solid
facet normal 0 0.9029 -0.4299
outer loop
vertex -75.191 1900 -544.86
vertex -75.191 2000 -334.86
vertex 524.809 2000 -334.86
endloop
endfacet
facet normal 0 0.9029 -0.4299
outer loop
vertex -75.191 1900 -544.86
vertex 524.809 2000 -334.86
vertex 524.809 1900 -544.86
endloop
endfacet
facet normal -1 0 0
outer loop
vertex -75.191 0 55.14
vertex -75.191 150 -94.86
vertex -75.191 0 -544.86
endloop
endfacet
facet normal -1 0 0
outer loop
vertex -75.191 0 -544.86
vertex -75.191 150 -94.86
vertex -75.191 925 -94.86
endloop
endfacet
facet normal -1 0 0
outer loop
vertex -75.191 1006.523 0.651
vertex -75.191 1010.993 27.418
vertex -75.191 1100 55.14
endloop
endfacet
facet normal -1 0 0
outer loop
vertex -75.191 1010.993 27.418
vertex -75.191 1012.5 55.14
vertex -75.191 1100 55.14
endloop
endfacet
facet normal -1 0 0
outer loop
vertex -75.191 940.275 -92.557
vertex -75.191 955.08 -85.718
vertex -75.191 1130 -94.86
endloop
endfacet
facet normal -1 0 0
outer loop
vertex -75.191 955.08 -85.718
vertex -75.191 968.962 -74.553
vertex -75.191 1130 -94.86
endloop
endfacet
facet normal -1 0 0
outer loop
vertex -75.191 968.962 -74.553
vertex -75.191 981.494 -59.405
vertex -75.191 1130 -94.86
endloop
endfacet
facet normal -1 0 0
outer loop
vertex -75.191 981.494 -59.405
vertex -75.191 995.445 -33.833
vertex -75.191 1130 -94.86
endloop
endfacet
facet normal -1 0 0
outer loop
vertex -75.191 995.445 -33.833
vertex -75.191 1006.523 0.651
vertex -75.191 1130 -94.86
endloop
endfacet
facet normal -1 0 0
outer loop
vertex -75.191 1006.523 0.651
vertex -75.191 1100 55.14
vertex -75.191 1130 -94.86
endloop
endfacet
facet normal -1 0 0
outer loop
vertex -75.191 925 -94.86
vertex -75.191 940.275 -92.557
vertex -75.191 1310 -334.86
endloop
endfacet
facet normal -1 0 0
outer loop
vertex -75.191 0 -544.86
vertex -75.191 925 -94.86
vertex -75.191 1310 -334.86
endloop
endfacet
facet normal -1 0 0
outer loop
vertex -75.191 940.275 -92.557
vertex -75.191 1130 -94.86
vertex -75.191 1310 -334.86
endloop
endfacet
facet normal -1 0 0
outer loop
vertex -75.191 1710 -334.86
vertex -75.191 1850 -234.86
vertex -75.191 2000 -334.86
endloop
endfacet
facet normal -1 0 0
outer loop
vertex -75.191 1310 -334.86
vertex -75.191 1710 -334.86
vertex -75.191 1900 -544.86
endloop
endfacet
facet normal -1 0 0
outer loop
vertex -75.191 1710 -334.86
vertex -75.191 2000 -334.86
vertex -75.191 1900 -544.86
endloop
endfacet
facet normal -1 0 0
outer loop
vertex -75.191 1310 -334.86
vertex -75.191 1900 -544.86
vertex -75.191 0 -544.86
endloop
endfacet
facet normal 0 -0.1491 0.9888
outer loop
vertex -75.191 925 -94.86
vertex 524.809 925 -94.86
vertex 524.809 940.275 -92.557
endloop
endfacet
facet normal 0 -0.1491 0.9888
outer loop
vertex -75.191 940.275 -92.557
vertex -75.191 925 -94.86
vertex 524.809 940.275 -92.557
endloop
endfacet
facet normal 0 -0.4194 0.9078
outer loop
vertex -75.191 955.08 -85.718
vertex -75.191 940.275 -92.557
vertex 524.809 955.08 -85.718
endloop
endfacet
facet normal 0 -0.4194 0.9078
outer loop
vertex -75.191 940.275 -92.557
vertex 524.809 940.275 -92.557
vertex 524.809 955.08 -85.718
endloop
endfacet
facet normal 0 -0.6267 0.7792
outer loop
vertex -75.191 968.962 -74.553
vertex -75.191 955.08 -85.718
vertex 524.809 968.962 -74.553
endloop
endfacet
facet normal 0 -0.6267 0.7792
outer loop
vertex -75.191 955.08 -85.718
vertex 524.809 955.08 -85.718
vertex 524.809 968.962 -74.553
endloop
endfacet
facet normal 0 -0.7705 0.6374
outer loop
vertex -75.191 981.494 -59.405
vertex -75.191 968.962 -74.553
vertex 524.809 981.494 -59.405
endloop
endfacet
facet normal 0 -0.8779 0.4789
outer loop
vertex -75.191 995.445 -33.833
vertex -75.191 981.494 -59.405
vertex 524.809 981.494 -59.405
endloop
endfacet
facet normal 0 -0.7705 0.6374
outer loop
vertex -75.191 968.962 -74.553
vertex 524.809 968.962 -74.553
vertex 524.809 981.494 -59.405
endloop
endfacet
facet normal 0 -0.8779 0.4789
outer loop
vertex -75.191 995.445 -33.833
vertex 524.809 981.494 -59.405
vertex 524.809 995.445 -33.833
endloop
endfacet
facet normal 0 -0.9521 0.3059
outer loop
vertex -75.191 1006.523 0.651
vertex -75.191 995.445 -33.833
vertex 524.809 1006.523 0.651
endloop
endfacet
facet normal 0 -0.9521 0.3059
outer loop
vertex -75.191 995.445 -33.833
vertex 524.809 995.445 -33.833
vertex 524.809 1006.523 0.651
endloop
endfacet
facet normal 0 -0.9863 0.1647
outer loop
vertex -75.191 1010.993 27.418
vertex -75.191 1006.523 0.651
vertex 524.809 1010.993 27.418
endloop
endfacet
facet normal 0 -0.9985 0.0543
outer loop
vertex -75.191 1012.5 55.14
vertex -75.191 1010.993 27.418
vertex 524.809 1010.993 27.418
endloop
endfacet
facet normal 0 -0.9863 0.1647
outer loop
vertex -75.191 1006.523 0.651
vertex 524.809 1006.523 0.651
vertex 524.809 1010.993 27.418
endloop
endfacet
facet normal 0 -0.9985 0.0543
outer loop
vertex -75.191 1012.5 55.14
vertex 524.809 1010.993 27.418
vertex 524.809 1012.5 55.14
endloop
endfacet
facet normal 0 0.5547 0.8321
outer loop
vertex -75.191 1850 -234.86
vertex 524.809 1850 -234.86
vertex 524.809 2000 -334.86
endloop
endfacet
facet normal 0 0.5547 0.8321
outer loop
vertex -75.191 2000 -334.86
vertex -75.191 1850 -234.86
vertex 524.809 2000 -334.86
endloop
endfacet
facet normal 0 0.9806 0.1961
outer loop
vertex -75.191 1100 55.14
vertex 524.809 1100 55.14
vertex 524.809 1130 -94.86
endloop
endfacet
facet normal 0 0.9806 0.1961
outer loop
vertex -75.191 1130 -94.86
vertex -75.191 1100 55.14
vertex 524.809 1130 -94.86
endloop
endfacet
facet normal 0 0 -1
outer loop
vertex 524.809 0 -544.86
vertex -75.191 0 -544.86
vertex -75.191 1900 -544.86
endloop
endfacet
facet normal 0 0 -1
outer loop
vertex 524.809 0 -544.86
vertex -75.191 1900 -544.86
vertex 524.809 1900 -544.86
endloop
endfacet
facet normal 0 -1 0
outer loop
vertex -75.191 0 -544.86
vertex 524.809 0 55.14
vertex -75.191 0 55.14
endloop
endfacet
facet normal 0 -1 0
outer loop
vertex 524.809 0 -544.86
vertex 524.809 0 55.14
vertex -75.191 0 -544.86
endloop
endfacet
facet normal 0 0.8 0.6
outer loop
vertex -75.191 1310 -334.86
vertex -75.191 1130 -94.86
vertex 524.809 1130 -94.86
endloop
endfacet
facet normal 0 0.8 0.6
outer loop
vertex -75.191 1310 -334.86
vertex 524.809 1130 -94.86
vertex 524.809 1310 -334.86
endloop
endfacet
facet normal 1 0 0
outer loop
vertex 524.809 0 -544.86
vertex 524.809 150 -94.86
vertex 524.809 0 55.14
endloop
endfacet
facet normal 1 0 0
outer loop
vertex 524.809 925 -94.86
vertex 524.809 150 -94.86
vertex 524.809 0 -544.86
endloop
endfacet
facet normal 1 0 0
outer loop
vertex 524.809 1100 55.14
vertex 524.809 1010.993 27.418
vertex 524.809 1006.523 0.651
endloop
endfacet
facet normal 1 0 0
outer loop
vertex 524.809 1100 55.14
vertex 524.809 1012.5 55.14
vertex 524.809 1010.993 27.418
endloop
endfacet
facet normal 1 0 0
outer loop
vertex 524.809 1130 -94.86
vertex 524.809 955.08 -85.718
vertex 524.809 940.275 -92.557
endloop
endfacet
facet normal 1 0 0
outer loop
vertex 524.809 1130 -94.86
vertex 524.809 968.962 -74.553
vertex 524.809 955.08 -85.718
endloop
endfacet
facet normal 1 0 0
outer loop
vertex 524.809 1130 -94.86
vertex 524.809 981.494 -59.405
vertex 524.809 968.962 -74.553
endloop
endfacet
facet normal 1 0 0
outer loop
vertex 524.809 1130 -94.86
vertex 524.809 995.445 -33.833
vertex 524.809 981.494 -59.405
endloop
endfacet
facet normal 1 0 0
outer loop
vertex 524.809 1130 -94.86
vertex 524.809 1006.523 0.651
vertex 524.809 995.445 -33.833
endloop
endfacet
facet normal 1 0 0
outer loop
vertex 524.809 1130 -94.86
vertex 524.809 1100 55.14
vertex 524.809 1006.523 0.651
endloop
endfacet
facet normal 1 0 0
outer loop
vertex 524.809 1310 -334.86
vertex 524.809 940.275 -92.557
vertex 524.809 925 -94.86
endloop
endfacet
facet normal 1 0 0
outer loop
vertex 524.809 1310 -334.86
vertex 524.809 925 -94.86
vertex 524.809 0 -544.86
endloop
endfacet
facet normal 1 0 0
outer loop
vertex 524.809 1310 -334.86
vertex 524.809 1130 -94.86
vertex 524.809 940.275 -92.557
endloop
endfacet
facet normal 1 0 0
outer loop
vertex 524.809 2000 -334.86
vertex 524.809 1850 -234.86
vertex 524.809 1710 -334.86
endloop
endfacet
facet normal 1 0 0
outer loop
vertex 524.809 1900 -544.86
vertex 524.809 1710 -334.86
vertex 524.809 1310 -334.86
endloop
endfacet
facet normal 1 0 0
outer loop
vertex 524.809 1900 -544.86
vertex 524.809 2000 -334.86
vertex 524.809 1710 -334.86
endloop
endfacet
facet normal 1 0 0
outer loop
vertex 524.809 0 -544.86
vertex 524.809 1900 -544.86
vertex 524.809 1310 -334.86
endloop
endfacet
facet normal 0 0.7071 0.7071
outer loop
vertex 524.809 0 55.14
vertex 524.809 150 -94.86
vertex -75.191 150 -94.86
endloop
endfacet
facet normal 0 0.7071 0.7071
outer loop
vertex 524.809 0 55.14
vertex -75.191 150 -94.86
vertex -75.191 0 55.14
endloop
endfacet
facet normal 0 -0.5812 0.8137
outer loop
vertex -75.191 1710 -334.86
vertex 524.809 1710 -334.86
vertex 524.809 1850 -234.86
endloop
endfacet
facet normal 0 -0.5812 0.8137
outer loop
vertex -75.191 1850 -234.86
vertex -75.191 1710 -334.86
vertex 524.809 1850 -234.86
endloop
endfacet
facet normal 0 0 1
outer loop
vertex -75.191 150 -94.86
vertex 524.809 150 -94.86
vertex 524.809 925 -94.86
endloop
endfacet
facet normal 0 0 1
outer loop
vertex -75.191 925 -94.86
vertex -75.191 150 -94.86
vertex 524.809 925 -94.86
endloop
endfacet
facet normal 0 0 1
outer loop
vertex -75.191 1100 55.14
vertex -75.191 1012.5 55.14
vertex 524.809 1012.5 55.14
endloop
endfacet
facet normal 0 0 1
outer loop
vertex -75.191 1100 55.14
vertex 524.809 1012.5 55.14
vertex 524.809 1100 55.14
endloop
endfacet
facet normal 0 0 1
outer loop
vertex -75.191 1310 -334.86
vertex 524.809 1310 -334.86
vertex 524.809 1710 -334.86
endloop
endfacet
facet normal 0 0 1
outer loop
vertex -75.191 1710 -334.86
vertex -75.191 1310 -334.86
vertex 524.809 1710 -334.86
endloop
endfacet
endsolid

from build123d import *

# Parameters (mm, degrees)
ESQUISSE1_W                   = 600
ESQUISSE1_H                   = 600
BOSS_EXTRU_1_DEPTH            = 2000
ESQUISSE11_W                  = 150
ESQUISSE11_H                  = 800
ENL_V_MAT_EXTRU_1_DEPTH       = 600
ESQUISSE12_W                  = 150
ESQUISSE12_H                  = 1100
ENL_V_MAT_EXTRU_2_DEPTH       = 600
ESQUISSE14_W                  = 150
ESQUISSE14_H                  = 150
BOSS_EXTRU_3_DEPTH            = 600
ENL_V_MAT_EXTRU_5_DEPTH       = 600
ESQUISSE19_W                  = 150
ESQUISSE19_H                  = 100
ENL_V_MAT_EXTRU_6_DEPTH       = 600
ESQUISSE25_W                  = 150
ESQUISSE25_H                  = 100
BOSS_EXTRU_4_DEPTH            = 600
ESQUISSE26_W                  = 150
ESQUISSE26_H                  = 75
BOSS_EXTRU_7_DEPTH            = 600
ESQUISSE30_RX                 = 150
ESQUISSE30_RY                 = 87.5
ENL_V_MAT_EXTRU_7_DEPTH       = 600
ESQUISSE32_W                  = 150
ESQUISSE32_H                  = 30
BOSS_EXTRU_8_DEPTH            = 600
ENL_V_MAT_EXTRU_8_DEPTH       = 2158.978826807
ENL_V_MAT_EXTRU_8_DEPTH_BACK  = 600
ESQUISSE34_W                  = 240
ESQUISSE34_H                  = 870
ENL_V_MAT_EXTRU_9_DEPTH       = 600
ESQUISSE35_W                  = 240
ESQUISSE35_H                  = 180
BOSS_EXTRU_9_DEPTH            = 600
ENL_V_START                   = -600
ENL_V_MAT_EXTRU_10_DEPTH      = 600
ENL_V_MAT_EXTRU_11_DEPTH      = 2158.978826807
ENL_V_MAT_EXTRU_11_DEPTH_BACK = 600
ENL_V_MAT_EXTRU_12_DEPTH      = 2158.978826807
ENL_V_MAT_EXTRU_12_DEPTH_BACK = 600
ESQUISSE41_W                  = 210
ESQUISSE41_H                  = 100
BOSS_EXTRU_10_DEPTH           = 600
ESQUISSE43_W                  = 100
ESQUISSE43_H                  = 150
BOSS_EXTRU_12_DEPTH           = 600
ESQUISSE44_W                  = 100
ESQUISSE44_H                  = 140
BOSS_EXTRU_13_DEPTH           = 600
ENL_V_MAT_EXTRU_13_DEPTH      = 600
ENL_V_MAT_EXTRU_14_DEPTH      = 600
ENL_V_MAT_EXTRU_15_DEPTH      = 600


# Read off the part's stored shape, not the designer's step: Enlèv. mat.-Extru.10
with BuildPart() as part:
    # Esquisse1 → Boss.-Extru.1 (new body)
    with BuildSketch(Plane(origin=(0, 0, 0), x_dir=(1, 0, 0), z_dir=(0, 1, 0))):
        with Locations((224.80933771, 244.860180987)):
            Rectangle(ESQUISSE1_W, ESQUISSE1_H)
    extrude(amount=BOSS_EXTRU_1_DEPTH)

    # Esquisse11 → Enlèv. mat.-Extru.1 (cut)
    with BuildSketch(Plane(origin=(524.80933771, 0, 0), x_dir=(0, 0, -1), z_dir=(1, 0, 0))):
        with Locations((19.860180987, 400)):
            Rectangle(ESQUISSE11_W, ESQUISSE11_H)
    extrude(amount=-ENL_V_MAT_EXTRU_1_DEPTH, mode=Mode.SUBTRACT)

    # Esquisse12 → Enlèv. mat.-Extru.2 (cut)
    with BuildSketch(Plane(origin=(524.80933771, 0, 0), x_dir=(0, 0, -1), z_dir=(1, 0, 0))):
        with Locations((19.860180987, 1450)):
            Rectangle(ESQUISSE12_W, ESQUISSE12_H)
    extrude(amount=-ENL_V_MAT_EXTRU_2_DEPTH, mode=Mode.SUBTRACT)

    # Esquisse14 → Boss.-Extru.3 (add)
    with BuildSketch(Plane(origin=(524.80933771, 0, 0), x_dir=(0, 0, -1), z_dir=(1, 0, 0))):
        with Locations((19.860180987, 75)):
            Rectangle(ESQUISSE14_W, ESQUISSE14_H)
    extrude(amount=-BOSS_EXTRU_3_DEPTH)

    # Esquisse18 → Enlèv. mat.-Extru.5 (cut)
    with BuildSketch(Plane(origin=(524.80933771, 0, 0), x_dir=(0, 0, -1), z_dir=(1, 0, 0))):
        Polygon((94.860180987, 150), (-55.139819013, 0), (-55.139819013, 150), align=None)
    extrude(amount=-ENL_V_MAT_EXTRU_5_DEPTH, mode=Mode.SUBTRACT)

    # Esquisse19 → Enlèv. mat.-Extru.6 (cut)
    with BuildSketch(Plane(origin=(524.80933771, 0, 0), x_dir=(0, 0, -1), z_dir=(1, 0, 0))):
        with Locations((19.860180987, 850)):
            Rectangle(ESQUISSE19_W, ESQUISSE19_H)
    extrude(amount=-ENL_V_MAT_EXTRU_6_DEPTH, mode=Mode.SUBTRACT)

    # Esquisse25 → Boss.-Extru.4 (add)
    with BuildSketch(Plane(origin=(524.80933771, 0, 0), x_dir=(0, 0, -1), z_dir=(1, 0, 0))):
        with Locations((19.860180987, 1050)):
            Rectangle(ESQUISSE25_W, ESQUISSE25_H)
    extrude(amount=-BOSS_EXTRU_4_DEPTH)

    # Esquisse26 → Boss.-Extru.7 (add)
    with BuildSketch(Plane(origin=(524.80933771, 0, 0), x_dir=(0, 0, -1), z_dir=(1, 0, 0))):
        with Locations((19.860180987, 962.5)):
            Rectangle(ESQUISSE26_W, ESQUISSE26_H)
    extrude(amount=-BOSS_EXTRU_7_DEPTH)

    # Esquisse30 → Enlèv. mat.-Extru.7 (cut)
    with BuildSketch(Plane(origin=(524.80933771, 0, 0), x_dir=(0, 0, -1), z_dir=(1, 0, 0))):
        with Locations((-55.139819013, 925)):
            Ellipse(ESQUISSE30_RX, ESQUISSE30_RY)
    extrude(amount=-ENL_V_MAT_EXTRU_7_DEPTH, mode=Mode.SUBTRACT)

    # Esquisse32 → Boss.-Extru.8 (add)
    with BuildSketch(Plane(origin=(524.80933771, 0, 0), x_dir=(0, 0, -1), z_dir=(1, 0, 0))):
        with Locations((19.860180987, 1115)):
            Rectangle(ESQUISSE32_W, ESQUISSE32_H)
    extrude(amount=-BOSS_EXTRU_8_DEPTH)

    # Esquisse33 → Enlèv. mat.-Extru.8 (cut, two sides: drawn at the far end of the back side and taken through both)
    with BuildSketch(Plane(origin=(524.80933771, 0, 0), x_dir=(0, 0, -1), z_dir=(1, 0, 0)).offset(-ENL_V_MAT_EXTRU_8_DEPTH_BACK)):
        Polygon((94.860180987, 1130), (-55.139819013, 1130), (-55.139819013, 1100), align=None)
    extrude(amount=ENL_V_MAT_EXTRU_8_DEPTH + ENL_V_MAT_EXTRU_8_DEPTH_BACK, mode=Mode.SUBTRACT)

    # Esquisse34 → Enlèv. mat.-Extru.9 (cut)
    with BuildSketch(Plane(origin=(524.80933771, 0, 0), x_dir=(0, 0, -1), z_dir=(1, 0, 0))):
        with Locations((214.860180987, 1565)):
            Rectangle(ESQUISSE34_W, ESQUISSE34_H)
    extrude(amount=-ENL_V_MAT_EXTRU_9_DEPTH, mode=Mode.SUBTRACT)

    # Esquisse35 → Boss.-Extru.9 (add)
    with BuildSketch(Plane(origin=(524.80933771, 0, 0), x_dir=(0, 0, -1), z_dir=(1, 0, 0))):
        with Locations((214.860180987, 1220)):
            Rectangle(ESQUISSE35_W, ESQUISSE35_H)
    extrude(amount=-BOSS_EXTRU_9_DEPTH)

    # Enlèv. mat.-Extru.10 outline → Enlèv. mat.-Extru.10 (cut)
    with BuildSketch(Plane(origin=(524.80933771, 0, 0), x_dir=(0, 0, -1), z_dir=(1, 0, 0)).offset(ENL_V_START)):
        Polygon((94.860180987, 1310), (94.860180987, 1130), (334.860180987, 1310), align=None)
    extrude(amount=ENL_V_MAT_EXTRU_10_DEPTH, mode=Mode.SUBTRACT)

    # Esquisse37 → Enlèv. mat.-Extru.11 (cut, two sides: drawn at the far end of the back side and taken through both)
    with BuildSketch(Plane(origin=(524.80933771, 0, 0), x_dir=(0, 0, -1), z_dir=(1, 0, 0)).offset(-ENL_V_MAT_EXTRU_11_DEPTH_BACK)):
        Polygon((544.860180987, 1900), (544.860180987, 2000), (394.860180987, 2000), align=None)
    extrude(amount=ENL_V_MAT_EXTRU_11_DEPTH + ENL_V_MAT_EXTRU_11_DEPTH_BACK, mode=Mode.SUBTRACT)

    # Esquisse38 → Enlèv. mat.-Extru.12 (cut, two sides: drawn at the far end of the back side and taken through both)
    with BuildSketch(Plane(origin=(524.80933771, 0, 0), x_dir=(0, 0, -1), z_dir=(1, 0, 0)).offset(-ENL_V_MAT_EXTRU_12_DEPTH_BACK)):
        Polygon((2509.437735817, 5524.295924716), (394.860180987, 2000), (334.860180987, 1900), (-1779.717373842, -1624.295924716), (-8828.309223275, 2604.859184943), (-4539.154113615, 9753.451034376), align=None)
    extrude(amount=ENL_V_MAT_EXTRU_12_DEPTH + ENL_V_MAT_EXTRU_12_DEPTH_BACK, mode=Mode.SUBTRACT)

    # Esquisse41 → Boss.-Extru.10 (add)
    with BuildSketch(Plane(origin=(524.80933771, 0, 0), x_dir=(0, 0, -1), z_dir=(1, 0, 0))):
        with Locations((439.860180987, 1950)):
            Rectangle(ESQUISSE41_W, ESQUISSE41_H)
    extrude(amount=-BOSS_EXTRU_10_DEPTH)

    # Esquisse43 → Boss.-Extru.12 (add)
    with BuildSketch(Plane(origin=(524.80933771, 0, 0), x_dir=(0, 0, -1), z_dir=(1, 0, 0))):
        with Locations((284.860180987, 1925)):
            Rectangle(ESQUISSE43_W, ESQUISSE43_H)
    extrude(amount=-BOSS_EXTRU_12_DEPTH)

    # Esquisse44 → Boss.-Extru.13 (add)
    with BuildSketch(Plane(origin=(524.80933771, 0, 0), x_dir=(0, 0, -1), z_dir=(1, 0, 0))):
        with Locations((284.860180987, 1780)):
            Rectangle(ESQUISSE44_W, ESQUISSE44_H)
    extrude(amount=-BOSS_EXTRU_13_DEPTH)

    # Esquisse45 → Enlèv. mat.-Extru.13 (cut)
    with BuildSketch(Plane(origin=(524.80933771, 0, 0), x_dir=(0, 0, -1), z_dir=(1, 0, 0))):
        Polygon((334.860180987, 1710), (234.860180987, 1850), (234.860180987, 1710), align=None)
    extrude(amount=-ENL_V_MAT_EXTRU_13_DEPTH, mode=Mode.SUBTRACT)

    # Esquisse46 → Enlèv. mat.-Extru.14 (cut)
    with BuildSketch(Plane(origin=(524.80933771, 0, 0), x_dir=(0, 0, -1), z_dir=(1, 0, 0))):
        Polygon((234.860180987, 1850), (334.860180987, 2000), (234.860180987, 2000), align=None)
    extrude(amount=-ENL_V_MAT_EXTRU_14_DEPTH, mode=Mode.SUBTRACT)

    # Esquisse47 → Enlèv. mat.-Extru.15 (cut)
    with BuildSketch(Plane(origin=(524.80933771, 0, 0), x_dir=(0, 0, -1), z_dir=(1, 0, 0))):
        Polygon((544.860180987, 2000), (334.860180987, 2000), (544.860180987, 1900), align=None)
    extrude(amount=-ENL_V_MAT_EXTRU_15_DEPTH, mode=Mode.SUBTRACT)


solid = part.part
